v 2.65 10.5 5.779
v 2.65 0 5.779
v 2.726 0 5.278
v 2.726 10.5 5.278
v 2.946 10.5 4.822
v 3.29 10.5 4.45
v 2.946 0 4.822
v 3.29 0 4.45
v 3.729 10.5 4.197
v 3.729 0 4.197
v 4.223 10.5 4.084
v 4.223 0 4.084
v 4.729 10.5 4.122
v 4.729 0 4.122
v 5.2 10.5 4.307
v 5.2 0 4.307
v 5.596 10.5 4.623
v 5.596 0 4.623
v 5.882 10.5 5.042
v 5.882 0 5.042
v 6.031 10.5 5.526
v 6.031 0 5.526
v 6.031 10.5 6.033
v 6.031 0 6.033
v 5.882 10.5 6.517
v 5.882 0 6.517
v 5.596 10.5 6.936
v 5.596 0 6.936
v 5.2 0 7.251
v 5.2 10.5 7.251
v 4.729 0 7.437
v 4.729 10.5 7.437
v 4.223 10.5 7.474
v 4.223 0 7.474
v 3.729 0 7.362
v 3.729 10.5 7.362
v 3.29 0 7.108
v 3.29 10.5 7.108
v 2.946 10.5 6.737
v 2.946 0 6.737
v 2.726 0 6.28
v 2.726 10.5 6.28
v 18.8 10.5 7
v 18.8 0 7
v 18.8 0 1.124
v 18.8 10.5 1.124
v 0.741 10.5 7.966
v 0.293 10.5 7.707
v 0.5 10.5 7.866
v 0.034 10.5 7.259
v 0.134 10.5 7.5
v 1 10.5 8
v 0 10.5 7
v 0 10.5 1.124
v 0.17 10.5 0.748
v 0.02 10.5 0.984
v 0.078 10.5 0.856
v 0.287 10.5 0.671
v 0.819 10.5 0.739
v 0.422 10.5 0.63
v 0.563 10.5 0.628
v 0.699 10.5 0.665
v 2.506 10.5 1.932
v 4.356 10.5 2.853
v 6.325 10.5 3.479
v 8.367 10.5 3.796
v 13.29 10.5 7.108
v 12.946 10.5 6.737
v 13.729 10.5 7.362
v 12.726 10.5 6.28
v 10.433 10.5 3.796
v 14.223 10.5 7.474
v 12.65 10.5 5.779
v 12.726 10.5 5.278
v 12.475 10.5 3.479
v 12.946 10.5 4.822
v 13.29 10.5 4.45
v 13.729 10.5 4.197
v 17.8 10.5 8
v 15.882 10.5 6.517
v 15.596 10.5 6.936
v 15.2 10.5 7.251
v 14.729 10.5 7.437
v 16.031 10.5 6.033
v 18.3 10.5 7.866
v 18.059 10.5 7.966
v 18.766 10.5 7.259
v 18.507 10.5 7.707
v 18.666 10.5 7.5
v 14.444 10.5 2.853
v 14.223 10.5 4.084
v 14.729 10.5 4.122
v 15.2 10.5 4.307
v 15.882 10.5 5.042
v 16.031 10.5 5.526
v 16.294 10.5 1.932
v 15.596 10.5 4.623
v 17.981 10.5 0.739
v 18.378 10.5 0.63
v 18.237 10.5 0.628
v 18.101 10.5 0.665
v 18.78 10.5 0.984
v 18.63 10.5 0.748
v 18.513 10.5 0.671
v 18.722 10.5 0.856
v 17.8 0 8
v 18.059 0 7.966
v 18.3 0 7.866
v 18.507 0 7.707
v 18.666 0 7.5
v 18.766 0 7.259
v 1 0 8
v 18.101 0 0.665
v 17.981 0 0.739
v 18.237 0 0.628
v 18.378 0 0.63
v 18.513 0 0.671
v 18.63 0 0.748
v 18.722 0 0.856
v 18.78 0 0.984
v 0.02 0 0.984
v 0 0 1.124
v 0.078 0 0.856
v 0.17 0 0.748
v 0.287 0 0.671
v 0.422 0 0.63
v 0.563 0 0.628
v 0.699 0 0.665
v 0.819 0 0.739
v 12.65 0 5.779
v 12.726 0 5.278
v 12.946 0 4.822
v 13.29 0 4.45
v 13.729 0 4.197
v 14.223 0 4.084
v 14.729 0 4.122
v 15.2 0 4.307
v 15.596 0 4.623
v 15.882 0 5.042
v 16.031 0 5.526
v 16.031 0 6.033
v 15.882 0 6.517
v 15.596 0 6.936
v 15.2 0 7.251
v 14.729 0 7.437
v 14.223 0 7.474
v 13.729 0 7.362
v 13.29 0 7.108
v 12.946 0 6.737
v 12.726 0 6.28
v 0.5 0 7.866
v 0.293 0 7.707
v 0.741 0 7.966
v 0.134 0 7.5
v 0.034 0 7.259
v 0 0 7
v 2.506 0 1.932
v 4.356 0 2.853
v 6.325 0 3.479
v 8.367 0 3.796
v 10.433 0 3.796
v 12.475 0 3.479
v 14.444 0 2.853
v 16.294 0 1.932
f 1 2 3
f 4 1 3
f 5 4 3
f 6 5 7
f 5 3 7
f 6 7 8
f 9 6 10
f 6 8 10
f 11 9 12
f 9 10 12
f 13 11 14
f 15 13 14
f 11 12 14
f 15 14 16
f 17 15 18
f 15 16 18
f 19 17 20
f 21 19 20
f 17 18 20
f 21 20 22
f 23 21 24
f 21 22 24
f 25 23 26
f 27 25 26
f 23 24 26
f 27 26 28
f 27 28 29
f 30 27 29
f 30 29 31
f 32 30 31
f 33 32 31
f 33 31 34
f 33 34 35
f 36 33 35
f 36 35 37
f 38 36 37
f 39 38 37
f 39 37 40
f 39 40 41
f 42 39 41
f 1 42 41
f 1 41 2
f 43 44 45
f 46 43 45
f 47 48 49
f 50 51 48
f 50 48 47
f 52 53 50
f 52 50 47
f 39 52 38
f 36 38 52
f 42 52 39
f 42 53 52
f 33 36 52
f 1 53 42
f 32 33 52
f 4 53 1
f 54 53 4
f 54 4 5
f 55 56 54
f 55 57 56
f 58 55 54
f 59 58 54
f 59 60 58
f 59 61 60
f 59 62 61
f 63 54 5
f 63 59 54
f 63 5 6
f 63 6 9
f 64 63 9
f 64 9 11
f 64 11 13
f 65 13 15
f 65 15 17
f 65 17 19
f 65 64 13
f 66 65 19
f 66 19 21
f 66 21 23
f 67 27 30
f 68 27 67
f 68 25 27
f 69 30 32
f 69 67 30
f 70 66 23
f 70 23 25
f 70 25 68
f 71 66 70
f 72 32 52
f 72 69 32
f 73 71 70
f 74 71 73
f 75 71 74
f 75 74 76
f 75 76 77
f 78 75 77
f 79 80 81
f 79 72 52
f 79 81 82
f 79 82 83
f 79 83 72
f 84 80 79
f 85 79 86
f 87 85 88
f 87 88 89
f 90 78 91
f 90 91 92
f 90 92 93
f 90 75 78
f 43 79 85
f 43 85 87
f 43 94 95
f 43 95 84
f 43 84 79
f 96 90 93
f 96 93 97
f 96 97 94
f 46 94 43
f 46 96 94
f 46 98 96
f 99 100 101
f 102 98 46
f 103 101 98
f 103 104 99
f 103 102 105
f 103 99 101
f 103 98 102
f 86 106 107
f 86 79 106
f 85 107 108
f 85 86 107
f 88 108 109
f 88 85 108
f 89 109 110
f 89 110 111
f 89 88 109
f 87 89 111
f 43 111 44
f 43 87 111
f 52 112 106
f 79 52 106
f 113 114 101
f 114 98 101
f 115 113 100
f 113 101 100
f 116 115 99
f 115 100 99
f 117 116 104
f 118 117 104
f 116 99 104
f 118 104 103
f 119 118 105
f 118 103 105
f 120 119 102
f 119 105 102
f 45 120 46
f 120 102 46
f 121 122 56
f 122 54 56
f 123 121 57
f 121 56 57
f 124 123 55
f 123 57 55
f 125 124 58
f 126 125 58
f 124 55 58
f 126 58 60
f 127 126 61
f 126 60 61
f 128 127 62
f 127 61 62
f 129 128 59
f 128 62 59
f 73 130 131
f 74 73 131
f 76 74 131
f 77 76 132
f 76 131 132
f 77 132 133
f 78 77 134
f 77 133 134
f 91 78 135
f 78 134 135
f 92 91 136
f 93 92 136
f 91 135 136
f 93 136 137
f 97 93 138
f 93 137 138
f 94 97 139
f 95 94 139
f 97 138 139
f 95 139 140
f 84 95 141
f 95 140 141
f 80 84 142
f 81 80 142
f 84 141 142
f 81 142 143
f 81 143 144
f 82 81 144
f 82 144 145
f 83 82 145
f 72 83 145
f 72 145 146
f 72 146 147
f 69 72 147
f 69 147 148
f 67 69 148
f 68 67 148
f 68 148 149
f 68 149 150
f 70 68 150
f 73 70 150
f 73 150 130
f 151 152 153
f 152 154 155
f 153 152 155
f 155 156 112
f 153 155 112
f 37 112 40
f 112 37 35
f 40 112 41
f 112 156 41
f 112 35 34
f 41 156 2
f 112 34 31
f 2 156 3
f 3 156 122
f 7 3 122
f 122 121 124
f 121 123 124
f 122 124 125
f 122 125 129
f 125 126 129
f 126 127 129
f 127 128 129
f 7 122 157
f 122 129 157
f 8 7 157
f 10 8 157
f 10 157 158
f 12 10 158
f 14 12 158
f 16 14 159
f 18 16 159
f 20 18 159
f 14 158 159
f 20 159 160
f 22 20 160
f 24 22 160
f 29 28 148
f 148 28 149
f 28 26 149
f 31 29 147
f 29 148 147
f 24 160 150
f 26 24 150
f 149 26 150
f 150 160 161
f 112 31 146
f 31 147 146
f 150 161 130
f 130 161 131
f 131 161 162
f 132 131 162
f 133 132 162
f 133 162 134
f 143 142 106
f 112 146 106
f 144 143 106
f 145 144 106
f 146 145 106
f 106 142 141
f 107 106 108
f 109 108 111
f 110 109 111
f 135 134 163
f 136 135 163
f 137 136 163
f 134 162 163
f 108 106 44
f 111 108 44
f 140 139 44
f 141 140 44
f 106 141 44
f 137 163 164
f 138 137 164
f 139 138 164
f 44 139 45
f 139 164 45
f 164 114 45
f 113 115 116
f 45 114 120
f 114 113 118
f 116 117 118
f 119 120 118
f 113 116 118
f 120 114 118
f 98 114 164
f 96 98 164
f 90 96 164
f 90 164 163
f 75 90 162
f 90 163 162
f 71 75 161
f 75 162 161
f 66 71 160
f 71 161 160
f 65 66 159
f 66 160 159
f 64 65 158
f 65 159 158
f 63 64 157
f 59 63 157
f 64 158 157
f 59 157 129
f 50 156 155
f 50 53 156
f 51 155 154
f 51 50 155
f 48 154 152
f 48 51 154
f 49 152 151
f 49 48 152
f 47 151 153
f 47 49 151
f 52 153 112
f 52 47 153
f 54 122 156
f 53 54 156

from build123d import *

# Parameters (mm, degrees)
EXTRUDE_1_DEPTH   = 10.5
FILLET_1_R        = 1
HOLE_WIZARD_M31_D = 3.4
FILLET_2_R        = 0.5


with BuildPart() as part:
    # Эскиз1 → Бобышка-Вытянуть1 (new body)
    with BuildSketch(Plane(origin=(0, 0, 0), x_dir=(1, 0, 0), z_dir=(0, 1, 0))):
        with BuildLine():
            Line((0, 0), (0, -8))
            Line((0, -8), (18.8, -8))
            Line((18.8, -8), (18.8, 0))
            ThreePointArc((18.8, 0), (9.4, -3.835773145), (0, 0))
        make_face()
    extrude(amount=EXTRUDE_1_DEPTH)

    # Скругление1
    fillet_1_edges = [part.edges().sort_by_distance(p)[0] for p in [
        (18.8, 5.25, 8),
        (0, 5.25, 8),
    ]]
    fillet(fillet_1_edges, radius=FILLET_1_R)

    # Отверстие с зазором M31 (through all)
    with Locations(Plane(origin=(0, 10.5, 0), x_dir=(1, 0, 0), z_dir=(0, 1, 0))):
        with Locations((4.350247301, -5.779226371), (14.350247301, -5.779226371)):
            Hole(HOLE_WIZARD_M31_D / 2)

    # Скругление2
    fillet_2_edges = [part.edges().sort_by_distance(p)[0] for p in [
        (18.8, 5.25, 0),
        (0, 5.25, 0),
    ]]
    fillet(fillet_2_edges, radius=FILLET_2_R)


solid = part.part
